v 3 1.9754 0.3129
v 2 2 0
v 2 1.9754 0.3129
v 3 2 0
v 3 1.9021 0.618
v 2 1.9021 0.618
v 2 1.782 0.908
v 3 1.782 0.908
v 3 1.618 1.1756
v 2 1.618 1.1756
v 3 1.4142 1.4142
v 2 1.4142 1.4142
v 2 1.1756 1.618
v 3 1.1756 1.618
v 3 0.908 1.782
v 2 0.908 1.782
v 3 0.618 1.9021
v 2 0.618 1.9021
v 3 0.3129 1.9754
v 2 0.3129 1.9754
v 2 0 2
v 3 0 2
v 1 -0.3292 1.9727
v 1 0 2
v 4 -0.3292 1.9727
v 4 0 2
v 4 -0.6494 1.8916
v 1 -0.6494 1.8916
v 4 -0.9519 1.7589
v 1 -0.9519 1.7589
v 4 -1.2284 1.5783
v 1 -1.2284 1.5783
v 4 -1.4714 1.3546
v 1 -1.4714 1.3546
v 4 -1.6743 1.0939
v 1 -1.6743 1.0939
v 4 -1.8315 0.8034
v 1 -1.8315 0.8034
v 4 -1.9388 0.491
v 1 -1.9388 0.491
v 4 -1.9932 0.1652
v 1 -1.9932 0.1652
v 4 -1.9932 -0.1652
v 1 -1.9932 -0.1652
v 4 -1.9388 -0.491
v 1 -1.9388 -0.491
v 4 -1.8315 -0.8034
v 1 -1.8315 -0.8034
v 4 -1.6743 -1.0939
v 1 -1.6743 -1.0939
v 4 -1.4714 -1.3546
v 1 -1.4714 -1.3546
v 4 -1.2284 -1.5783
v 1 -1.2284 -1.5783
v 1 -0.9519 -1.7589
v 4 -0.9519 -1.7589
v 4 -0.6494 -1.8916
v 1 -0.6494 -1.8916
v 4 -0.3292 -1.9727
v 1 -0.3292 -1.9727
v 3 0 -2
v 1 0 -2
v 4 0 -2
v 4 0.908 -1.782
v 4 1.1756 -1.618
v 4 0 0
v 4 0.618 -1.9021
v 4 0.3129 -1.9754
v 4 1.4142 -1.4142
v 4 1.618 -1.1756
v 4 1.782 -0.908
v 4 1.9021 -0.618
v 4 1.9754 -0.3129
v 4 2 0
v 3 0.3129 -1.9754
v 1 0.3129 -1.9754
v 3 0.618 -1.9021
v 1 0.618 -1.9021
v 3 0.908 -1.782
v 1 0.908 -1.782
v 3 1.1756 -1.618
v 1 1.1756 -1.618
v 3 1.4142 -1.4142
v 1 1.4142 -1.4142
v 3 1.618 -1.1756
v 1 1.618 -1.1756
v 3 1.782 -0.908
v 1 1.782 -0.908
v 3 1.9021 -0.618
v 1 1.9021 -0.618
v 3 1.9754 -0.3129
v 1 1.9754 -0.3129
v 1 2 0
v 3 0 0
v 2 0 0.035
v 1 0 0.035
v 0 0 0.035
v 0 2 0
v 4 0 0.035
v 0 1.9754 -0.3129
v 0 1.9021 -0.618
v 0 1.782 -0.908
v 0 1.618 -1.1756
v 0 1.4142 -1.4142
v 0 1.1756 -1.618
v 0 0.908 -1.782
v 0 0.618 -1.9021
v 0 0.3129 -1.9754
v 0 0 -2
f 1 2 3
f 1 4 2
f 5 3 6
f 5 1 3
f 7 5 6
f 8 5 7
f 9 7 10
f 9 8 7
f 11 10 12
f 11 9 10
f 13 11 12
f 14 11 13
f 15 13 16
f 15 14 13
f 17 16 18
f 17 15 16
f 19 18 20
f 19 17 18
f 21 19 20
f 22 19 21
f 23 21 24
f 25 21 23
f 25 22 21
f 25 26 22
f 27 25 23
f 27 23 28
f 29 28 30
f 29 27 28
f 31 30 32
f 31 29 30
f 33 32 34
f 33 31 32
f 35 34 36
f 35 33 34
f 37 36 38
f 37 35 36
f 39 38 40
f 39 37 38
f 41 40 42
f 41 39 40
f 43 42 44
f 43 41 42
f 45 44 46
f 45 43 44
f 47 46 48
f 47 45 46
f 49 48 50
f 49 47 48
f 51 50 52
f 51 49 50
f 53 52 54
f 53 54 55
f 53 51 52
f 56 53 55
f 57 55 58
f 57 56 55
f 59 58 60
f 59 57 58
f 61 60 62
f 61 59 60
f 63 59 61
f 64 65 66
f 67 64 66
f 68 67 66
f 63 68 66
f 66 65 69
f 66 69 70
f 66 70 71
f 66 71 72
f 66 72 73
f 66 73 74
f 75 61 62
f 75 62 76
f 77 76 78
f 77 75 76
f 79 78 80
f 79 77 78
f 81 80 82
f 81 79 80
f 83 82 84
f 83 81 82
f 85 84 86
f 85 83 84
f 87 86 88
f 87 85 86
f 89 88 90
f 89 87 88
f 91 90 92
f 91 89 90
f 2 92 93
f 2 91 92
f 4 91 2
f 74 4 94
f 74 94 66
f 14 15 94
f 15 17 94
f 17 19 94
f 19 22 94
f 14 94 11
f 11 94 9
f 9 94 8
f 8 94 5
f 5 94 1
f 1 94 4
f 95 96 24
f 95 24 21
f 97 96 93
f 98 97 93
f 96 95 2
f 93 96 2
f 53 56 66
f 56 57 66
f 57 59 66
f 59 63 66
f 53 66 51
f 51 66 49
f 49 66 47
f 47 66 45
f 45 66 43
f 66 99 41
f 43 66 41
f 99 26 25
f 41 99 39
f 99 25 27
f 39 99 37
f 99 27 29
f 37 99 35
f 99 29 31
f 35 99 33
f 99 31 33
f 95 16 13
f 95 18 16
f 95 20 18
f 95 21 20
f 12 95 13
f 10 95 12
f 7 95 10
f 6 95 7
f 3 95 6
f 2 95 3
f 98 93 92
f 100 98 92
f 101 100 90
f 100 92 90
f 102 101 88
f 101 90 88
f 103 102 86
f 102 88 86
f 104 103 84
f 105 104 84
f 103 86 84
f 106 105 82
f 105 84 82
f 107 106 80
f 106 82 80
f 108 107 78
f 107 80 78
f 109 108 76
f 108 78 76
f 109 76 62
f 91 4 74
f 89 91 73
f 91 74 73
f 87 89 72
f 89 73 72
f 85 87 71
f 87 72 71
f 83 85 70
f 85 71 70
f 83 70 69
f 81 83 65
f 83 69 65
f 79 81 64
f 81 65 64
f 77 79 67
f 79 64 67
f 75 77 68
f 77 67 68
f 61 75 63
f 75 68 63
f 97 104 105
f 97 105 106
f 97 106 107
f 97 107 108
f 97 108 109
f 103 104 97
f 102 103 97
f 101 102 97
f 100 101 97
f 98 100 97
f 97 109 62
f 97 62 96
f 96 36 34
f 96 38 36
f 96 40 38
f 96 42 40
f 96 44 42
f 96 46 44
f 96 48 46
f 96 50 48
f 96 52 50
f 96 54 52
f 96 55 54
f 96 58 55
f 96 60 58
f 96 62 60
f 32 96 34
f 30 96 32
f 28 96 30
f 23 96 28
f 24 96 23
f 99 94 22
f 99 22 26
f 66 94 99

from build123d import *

# Parameters (mm, degrees)
SKETCH5_W           = 4
SKETCH5_H           = 2
SKETCH6_W           = 1
SKETCH6_H           = 2
CUT_EXTRUDE5_DEPTH  = 11
SKETCH8_W           = 0.5
SKETCH8_H           = 2
CUT_EXTRUDE7_DEPTH  = 10
SKETCH9_W           = 1.5
SKETCH9_H           = 2
CUT_EXTRUDE8_DEPTH  = 10
BOSS_EXTRUDE1_DEPTH = 4
SKETCH13_W          = 4.449870591
SKETCH13_H          = 3.198188742
CUT_EXTRUDE10_DEPTH = 1
SKETCH14_W          = 1
SKETCH14_H          = 2
CUT_EXTRUDE11_DEPTH = 10


with BuildPart() as part:
    # Sketch5 → Revolve-Thin2 (revolve)
    with BuildSketch(Plane.XY):
        with Locations((2, 1)):
            Rectangle(SKETCH5_W, SKETCH5_H)
    revolve(axis=Axis((0, 0, 0), (1, 0, 0)))

    # Sketch6 → Cut-Extrude5 (cut)
    with BuildSketch(Plane.XY):
        with Locations((3.5, 1)):
            Rectangle(SKETCH6_W, SKETCH6_H)
        with Locations((0.5, 1)):
            Rectangle(SKETCH6_W, SKETCH6_H)
    extrude(amount=-CUT_EXTRUDE5_DEPTH, mode=Mode.SUBTRACT)

    # Sketch8 → Cut-Extrude7 (cut)
    with BuildSketch(Plane(origin=(0, 0, 0), x_dir=(-1, 0, 0), z_dir=(0, 0, -1))):
        with Locations((-0.25, 1)):
            Rectangle(SKETCH8_W, SKETCH8_H)
    extrude(amount=-CUT_EXTRUDE7_DEPTH, mode=Mode.SUBTRACT)

    # Sketch9 → Cut-Extrude8 (cut)
    with BuildSketch(Plane(origin=(0, 0, 0), x_dir=(-1, 0, 0), z_dir=(0, 0, -1))):
        with Locations((-1.25, 1)):
            Rectangle(SKETCH9_W, SKETCH9_H)
    extrude(amount=-CUT_EXTRUDE8_DEPTH, mode=Mode.SUBTRACT)

    # Sketch10 → Boss-Extrude1 (add)
    with BuildSketch(Plane(origin=(4, 0, 0), x_dir=(0, 0, -1), z_dir=(1, 0, 0))):
        with BuildLine():
            Line((2, 0), (-0.034977088, 0))
            Line((-0.034977088, 0), (0, 2))
            ThreePointArc((0, 2), (1.414213562, 1.414213562), (2, 0))
        make_face()
    extrude(amount=-BOSS_EXTRUDE1_DEPTH)

    # Sketch13 → Cut-Extrude10 (cut)
    with BuildSketch(Plane.ZY):
        with Locations((-0.224935296, -1.599094371)):
            Rectangle(SKETCH13_W, SKETCH13_H)
    extrude(amount=-CUT_EXTRUDE10_DEPTH, mode=Mode.SUBTRACT)

    # Sketch14 → Cut-Extrude11 (cut)
    with BuildSketch(Plane.XY):
        with Locations((3.5, 1)):
            Rectangle(SKETCH14_W, SKETCH14_H)
    extrude(amount=CUT_EXTRUDE11_DEPTH, mode=Mode.SUBTRACT)


solid = part.part
